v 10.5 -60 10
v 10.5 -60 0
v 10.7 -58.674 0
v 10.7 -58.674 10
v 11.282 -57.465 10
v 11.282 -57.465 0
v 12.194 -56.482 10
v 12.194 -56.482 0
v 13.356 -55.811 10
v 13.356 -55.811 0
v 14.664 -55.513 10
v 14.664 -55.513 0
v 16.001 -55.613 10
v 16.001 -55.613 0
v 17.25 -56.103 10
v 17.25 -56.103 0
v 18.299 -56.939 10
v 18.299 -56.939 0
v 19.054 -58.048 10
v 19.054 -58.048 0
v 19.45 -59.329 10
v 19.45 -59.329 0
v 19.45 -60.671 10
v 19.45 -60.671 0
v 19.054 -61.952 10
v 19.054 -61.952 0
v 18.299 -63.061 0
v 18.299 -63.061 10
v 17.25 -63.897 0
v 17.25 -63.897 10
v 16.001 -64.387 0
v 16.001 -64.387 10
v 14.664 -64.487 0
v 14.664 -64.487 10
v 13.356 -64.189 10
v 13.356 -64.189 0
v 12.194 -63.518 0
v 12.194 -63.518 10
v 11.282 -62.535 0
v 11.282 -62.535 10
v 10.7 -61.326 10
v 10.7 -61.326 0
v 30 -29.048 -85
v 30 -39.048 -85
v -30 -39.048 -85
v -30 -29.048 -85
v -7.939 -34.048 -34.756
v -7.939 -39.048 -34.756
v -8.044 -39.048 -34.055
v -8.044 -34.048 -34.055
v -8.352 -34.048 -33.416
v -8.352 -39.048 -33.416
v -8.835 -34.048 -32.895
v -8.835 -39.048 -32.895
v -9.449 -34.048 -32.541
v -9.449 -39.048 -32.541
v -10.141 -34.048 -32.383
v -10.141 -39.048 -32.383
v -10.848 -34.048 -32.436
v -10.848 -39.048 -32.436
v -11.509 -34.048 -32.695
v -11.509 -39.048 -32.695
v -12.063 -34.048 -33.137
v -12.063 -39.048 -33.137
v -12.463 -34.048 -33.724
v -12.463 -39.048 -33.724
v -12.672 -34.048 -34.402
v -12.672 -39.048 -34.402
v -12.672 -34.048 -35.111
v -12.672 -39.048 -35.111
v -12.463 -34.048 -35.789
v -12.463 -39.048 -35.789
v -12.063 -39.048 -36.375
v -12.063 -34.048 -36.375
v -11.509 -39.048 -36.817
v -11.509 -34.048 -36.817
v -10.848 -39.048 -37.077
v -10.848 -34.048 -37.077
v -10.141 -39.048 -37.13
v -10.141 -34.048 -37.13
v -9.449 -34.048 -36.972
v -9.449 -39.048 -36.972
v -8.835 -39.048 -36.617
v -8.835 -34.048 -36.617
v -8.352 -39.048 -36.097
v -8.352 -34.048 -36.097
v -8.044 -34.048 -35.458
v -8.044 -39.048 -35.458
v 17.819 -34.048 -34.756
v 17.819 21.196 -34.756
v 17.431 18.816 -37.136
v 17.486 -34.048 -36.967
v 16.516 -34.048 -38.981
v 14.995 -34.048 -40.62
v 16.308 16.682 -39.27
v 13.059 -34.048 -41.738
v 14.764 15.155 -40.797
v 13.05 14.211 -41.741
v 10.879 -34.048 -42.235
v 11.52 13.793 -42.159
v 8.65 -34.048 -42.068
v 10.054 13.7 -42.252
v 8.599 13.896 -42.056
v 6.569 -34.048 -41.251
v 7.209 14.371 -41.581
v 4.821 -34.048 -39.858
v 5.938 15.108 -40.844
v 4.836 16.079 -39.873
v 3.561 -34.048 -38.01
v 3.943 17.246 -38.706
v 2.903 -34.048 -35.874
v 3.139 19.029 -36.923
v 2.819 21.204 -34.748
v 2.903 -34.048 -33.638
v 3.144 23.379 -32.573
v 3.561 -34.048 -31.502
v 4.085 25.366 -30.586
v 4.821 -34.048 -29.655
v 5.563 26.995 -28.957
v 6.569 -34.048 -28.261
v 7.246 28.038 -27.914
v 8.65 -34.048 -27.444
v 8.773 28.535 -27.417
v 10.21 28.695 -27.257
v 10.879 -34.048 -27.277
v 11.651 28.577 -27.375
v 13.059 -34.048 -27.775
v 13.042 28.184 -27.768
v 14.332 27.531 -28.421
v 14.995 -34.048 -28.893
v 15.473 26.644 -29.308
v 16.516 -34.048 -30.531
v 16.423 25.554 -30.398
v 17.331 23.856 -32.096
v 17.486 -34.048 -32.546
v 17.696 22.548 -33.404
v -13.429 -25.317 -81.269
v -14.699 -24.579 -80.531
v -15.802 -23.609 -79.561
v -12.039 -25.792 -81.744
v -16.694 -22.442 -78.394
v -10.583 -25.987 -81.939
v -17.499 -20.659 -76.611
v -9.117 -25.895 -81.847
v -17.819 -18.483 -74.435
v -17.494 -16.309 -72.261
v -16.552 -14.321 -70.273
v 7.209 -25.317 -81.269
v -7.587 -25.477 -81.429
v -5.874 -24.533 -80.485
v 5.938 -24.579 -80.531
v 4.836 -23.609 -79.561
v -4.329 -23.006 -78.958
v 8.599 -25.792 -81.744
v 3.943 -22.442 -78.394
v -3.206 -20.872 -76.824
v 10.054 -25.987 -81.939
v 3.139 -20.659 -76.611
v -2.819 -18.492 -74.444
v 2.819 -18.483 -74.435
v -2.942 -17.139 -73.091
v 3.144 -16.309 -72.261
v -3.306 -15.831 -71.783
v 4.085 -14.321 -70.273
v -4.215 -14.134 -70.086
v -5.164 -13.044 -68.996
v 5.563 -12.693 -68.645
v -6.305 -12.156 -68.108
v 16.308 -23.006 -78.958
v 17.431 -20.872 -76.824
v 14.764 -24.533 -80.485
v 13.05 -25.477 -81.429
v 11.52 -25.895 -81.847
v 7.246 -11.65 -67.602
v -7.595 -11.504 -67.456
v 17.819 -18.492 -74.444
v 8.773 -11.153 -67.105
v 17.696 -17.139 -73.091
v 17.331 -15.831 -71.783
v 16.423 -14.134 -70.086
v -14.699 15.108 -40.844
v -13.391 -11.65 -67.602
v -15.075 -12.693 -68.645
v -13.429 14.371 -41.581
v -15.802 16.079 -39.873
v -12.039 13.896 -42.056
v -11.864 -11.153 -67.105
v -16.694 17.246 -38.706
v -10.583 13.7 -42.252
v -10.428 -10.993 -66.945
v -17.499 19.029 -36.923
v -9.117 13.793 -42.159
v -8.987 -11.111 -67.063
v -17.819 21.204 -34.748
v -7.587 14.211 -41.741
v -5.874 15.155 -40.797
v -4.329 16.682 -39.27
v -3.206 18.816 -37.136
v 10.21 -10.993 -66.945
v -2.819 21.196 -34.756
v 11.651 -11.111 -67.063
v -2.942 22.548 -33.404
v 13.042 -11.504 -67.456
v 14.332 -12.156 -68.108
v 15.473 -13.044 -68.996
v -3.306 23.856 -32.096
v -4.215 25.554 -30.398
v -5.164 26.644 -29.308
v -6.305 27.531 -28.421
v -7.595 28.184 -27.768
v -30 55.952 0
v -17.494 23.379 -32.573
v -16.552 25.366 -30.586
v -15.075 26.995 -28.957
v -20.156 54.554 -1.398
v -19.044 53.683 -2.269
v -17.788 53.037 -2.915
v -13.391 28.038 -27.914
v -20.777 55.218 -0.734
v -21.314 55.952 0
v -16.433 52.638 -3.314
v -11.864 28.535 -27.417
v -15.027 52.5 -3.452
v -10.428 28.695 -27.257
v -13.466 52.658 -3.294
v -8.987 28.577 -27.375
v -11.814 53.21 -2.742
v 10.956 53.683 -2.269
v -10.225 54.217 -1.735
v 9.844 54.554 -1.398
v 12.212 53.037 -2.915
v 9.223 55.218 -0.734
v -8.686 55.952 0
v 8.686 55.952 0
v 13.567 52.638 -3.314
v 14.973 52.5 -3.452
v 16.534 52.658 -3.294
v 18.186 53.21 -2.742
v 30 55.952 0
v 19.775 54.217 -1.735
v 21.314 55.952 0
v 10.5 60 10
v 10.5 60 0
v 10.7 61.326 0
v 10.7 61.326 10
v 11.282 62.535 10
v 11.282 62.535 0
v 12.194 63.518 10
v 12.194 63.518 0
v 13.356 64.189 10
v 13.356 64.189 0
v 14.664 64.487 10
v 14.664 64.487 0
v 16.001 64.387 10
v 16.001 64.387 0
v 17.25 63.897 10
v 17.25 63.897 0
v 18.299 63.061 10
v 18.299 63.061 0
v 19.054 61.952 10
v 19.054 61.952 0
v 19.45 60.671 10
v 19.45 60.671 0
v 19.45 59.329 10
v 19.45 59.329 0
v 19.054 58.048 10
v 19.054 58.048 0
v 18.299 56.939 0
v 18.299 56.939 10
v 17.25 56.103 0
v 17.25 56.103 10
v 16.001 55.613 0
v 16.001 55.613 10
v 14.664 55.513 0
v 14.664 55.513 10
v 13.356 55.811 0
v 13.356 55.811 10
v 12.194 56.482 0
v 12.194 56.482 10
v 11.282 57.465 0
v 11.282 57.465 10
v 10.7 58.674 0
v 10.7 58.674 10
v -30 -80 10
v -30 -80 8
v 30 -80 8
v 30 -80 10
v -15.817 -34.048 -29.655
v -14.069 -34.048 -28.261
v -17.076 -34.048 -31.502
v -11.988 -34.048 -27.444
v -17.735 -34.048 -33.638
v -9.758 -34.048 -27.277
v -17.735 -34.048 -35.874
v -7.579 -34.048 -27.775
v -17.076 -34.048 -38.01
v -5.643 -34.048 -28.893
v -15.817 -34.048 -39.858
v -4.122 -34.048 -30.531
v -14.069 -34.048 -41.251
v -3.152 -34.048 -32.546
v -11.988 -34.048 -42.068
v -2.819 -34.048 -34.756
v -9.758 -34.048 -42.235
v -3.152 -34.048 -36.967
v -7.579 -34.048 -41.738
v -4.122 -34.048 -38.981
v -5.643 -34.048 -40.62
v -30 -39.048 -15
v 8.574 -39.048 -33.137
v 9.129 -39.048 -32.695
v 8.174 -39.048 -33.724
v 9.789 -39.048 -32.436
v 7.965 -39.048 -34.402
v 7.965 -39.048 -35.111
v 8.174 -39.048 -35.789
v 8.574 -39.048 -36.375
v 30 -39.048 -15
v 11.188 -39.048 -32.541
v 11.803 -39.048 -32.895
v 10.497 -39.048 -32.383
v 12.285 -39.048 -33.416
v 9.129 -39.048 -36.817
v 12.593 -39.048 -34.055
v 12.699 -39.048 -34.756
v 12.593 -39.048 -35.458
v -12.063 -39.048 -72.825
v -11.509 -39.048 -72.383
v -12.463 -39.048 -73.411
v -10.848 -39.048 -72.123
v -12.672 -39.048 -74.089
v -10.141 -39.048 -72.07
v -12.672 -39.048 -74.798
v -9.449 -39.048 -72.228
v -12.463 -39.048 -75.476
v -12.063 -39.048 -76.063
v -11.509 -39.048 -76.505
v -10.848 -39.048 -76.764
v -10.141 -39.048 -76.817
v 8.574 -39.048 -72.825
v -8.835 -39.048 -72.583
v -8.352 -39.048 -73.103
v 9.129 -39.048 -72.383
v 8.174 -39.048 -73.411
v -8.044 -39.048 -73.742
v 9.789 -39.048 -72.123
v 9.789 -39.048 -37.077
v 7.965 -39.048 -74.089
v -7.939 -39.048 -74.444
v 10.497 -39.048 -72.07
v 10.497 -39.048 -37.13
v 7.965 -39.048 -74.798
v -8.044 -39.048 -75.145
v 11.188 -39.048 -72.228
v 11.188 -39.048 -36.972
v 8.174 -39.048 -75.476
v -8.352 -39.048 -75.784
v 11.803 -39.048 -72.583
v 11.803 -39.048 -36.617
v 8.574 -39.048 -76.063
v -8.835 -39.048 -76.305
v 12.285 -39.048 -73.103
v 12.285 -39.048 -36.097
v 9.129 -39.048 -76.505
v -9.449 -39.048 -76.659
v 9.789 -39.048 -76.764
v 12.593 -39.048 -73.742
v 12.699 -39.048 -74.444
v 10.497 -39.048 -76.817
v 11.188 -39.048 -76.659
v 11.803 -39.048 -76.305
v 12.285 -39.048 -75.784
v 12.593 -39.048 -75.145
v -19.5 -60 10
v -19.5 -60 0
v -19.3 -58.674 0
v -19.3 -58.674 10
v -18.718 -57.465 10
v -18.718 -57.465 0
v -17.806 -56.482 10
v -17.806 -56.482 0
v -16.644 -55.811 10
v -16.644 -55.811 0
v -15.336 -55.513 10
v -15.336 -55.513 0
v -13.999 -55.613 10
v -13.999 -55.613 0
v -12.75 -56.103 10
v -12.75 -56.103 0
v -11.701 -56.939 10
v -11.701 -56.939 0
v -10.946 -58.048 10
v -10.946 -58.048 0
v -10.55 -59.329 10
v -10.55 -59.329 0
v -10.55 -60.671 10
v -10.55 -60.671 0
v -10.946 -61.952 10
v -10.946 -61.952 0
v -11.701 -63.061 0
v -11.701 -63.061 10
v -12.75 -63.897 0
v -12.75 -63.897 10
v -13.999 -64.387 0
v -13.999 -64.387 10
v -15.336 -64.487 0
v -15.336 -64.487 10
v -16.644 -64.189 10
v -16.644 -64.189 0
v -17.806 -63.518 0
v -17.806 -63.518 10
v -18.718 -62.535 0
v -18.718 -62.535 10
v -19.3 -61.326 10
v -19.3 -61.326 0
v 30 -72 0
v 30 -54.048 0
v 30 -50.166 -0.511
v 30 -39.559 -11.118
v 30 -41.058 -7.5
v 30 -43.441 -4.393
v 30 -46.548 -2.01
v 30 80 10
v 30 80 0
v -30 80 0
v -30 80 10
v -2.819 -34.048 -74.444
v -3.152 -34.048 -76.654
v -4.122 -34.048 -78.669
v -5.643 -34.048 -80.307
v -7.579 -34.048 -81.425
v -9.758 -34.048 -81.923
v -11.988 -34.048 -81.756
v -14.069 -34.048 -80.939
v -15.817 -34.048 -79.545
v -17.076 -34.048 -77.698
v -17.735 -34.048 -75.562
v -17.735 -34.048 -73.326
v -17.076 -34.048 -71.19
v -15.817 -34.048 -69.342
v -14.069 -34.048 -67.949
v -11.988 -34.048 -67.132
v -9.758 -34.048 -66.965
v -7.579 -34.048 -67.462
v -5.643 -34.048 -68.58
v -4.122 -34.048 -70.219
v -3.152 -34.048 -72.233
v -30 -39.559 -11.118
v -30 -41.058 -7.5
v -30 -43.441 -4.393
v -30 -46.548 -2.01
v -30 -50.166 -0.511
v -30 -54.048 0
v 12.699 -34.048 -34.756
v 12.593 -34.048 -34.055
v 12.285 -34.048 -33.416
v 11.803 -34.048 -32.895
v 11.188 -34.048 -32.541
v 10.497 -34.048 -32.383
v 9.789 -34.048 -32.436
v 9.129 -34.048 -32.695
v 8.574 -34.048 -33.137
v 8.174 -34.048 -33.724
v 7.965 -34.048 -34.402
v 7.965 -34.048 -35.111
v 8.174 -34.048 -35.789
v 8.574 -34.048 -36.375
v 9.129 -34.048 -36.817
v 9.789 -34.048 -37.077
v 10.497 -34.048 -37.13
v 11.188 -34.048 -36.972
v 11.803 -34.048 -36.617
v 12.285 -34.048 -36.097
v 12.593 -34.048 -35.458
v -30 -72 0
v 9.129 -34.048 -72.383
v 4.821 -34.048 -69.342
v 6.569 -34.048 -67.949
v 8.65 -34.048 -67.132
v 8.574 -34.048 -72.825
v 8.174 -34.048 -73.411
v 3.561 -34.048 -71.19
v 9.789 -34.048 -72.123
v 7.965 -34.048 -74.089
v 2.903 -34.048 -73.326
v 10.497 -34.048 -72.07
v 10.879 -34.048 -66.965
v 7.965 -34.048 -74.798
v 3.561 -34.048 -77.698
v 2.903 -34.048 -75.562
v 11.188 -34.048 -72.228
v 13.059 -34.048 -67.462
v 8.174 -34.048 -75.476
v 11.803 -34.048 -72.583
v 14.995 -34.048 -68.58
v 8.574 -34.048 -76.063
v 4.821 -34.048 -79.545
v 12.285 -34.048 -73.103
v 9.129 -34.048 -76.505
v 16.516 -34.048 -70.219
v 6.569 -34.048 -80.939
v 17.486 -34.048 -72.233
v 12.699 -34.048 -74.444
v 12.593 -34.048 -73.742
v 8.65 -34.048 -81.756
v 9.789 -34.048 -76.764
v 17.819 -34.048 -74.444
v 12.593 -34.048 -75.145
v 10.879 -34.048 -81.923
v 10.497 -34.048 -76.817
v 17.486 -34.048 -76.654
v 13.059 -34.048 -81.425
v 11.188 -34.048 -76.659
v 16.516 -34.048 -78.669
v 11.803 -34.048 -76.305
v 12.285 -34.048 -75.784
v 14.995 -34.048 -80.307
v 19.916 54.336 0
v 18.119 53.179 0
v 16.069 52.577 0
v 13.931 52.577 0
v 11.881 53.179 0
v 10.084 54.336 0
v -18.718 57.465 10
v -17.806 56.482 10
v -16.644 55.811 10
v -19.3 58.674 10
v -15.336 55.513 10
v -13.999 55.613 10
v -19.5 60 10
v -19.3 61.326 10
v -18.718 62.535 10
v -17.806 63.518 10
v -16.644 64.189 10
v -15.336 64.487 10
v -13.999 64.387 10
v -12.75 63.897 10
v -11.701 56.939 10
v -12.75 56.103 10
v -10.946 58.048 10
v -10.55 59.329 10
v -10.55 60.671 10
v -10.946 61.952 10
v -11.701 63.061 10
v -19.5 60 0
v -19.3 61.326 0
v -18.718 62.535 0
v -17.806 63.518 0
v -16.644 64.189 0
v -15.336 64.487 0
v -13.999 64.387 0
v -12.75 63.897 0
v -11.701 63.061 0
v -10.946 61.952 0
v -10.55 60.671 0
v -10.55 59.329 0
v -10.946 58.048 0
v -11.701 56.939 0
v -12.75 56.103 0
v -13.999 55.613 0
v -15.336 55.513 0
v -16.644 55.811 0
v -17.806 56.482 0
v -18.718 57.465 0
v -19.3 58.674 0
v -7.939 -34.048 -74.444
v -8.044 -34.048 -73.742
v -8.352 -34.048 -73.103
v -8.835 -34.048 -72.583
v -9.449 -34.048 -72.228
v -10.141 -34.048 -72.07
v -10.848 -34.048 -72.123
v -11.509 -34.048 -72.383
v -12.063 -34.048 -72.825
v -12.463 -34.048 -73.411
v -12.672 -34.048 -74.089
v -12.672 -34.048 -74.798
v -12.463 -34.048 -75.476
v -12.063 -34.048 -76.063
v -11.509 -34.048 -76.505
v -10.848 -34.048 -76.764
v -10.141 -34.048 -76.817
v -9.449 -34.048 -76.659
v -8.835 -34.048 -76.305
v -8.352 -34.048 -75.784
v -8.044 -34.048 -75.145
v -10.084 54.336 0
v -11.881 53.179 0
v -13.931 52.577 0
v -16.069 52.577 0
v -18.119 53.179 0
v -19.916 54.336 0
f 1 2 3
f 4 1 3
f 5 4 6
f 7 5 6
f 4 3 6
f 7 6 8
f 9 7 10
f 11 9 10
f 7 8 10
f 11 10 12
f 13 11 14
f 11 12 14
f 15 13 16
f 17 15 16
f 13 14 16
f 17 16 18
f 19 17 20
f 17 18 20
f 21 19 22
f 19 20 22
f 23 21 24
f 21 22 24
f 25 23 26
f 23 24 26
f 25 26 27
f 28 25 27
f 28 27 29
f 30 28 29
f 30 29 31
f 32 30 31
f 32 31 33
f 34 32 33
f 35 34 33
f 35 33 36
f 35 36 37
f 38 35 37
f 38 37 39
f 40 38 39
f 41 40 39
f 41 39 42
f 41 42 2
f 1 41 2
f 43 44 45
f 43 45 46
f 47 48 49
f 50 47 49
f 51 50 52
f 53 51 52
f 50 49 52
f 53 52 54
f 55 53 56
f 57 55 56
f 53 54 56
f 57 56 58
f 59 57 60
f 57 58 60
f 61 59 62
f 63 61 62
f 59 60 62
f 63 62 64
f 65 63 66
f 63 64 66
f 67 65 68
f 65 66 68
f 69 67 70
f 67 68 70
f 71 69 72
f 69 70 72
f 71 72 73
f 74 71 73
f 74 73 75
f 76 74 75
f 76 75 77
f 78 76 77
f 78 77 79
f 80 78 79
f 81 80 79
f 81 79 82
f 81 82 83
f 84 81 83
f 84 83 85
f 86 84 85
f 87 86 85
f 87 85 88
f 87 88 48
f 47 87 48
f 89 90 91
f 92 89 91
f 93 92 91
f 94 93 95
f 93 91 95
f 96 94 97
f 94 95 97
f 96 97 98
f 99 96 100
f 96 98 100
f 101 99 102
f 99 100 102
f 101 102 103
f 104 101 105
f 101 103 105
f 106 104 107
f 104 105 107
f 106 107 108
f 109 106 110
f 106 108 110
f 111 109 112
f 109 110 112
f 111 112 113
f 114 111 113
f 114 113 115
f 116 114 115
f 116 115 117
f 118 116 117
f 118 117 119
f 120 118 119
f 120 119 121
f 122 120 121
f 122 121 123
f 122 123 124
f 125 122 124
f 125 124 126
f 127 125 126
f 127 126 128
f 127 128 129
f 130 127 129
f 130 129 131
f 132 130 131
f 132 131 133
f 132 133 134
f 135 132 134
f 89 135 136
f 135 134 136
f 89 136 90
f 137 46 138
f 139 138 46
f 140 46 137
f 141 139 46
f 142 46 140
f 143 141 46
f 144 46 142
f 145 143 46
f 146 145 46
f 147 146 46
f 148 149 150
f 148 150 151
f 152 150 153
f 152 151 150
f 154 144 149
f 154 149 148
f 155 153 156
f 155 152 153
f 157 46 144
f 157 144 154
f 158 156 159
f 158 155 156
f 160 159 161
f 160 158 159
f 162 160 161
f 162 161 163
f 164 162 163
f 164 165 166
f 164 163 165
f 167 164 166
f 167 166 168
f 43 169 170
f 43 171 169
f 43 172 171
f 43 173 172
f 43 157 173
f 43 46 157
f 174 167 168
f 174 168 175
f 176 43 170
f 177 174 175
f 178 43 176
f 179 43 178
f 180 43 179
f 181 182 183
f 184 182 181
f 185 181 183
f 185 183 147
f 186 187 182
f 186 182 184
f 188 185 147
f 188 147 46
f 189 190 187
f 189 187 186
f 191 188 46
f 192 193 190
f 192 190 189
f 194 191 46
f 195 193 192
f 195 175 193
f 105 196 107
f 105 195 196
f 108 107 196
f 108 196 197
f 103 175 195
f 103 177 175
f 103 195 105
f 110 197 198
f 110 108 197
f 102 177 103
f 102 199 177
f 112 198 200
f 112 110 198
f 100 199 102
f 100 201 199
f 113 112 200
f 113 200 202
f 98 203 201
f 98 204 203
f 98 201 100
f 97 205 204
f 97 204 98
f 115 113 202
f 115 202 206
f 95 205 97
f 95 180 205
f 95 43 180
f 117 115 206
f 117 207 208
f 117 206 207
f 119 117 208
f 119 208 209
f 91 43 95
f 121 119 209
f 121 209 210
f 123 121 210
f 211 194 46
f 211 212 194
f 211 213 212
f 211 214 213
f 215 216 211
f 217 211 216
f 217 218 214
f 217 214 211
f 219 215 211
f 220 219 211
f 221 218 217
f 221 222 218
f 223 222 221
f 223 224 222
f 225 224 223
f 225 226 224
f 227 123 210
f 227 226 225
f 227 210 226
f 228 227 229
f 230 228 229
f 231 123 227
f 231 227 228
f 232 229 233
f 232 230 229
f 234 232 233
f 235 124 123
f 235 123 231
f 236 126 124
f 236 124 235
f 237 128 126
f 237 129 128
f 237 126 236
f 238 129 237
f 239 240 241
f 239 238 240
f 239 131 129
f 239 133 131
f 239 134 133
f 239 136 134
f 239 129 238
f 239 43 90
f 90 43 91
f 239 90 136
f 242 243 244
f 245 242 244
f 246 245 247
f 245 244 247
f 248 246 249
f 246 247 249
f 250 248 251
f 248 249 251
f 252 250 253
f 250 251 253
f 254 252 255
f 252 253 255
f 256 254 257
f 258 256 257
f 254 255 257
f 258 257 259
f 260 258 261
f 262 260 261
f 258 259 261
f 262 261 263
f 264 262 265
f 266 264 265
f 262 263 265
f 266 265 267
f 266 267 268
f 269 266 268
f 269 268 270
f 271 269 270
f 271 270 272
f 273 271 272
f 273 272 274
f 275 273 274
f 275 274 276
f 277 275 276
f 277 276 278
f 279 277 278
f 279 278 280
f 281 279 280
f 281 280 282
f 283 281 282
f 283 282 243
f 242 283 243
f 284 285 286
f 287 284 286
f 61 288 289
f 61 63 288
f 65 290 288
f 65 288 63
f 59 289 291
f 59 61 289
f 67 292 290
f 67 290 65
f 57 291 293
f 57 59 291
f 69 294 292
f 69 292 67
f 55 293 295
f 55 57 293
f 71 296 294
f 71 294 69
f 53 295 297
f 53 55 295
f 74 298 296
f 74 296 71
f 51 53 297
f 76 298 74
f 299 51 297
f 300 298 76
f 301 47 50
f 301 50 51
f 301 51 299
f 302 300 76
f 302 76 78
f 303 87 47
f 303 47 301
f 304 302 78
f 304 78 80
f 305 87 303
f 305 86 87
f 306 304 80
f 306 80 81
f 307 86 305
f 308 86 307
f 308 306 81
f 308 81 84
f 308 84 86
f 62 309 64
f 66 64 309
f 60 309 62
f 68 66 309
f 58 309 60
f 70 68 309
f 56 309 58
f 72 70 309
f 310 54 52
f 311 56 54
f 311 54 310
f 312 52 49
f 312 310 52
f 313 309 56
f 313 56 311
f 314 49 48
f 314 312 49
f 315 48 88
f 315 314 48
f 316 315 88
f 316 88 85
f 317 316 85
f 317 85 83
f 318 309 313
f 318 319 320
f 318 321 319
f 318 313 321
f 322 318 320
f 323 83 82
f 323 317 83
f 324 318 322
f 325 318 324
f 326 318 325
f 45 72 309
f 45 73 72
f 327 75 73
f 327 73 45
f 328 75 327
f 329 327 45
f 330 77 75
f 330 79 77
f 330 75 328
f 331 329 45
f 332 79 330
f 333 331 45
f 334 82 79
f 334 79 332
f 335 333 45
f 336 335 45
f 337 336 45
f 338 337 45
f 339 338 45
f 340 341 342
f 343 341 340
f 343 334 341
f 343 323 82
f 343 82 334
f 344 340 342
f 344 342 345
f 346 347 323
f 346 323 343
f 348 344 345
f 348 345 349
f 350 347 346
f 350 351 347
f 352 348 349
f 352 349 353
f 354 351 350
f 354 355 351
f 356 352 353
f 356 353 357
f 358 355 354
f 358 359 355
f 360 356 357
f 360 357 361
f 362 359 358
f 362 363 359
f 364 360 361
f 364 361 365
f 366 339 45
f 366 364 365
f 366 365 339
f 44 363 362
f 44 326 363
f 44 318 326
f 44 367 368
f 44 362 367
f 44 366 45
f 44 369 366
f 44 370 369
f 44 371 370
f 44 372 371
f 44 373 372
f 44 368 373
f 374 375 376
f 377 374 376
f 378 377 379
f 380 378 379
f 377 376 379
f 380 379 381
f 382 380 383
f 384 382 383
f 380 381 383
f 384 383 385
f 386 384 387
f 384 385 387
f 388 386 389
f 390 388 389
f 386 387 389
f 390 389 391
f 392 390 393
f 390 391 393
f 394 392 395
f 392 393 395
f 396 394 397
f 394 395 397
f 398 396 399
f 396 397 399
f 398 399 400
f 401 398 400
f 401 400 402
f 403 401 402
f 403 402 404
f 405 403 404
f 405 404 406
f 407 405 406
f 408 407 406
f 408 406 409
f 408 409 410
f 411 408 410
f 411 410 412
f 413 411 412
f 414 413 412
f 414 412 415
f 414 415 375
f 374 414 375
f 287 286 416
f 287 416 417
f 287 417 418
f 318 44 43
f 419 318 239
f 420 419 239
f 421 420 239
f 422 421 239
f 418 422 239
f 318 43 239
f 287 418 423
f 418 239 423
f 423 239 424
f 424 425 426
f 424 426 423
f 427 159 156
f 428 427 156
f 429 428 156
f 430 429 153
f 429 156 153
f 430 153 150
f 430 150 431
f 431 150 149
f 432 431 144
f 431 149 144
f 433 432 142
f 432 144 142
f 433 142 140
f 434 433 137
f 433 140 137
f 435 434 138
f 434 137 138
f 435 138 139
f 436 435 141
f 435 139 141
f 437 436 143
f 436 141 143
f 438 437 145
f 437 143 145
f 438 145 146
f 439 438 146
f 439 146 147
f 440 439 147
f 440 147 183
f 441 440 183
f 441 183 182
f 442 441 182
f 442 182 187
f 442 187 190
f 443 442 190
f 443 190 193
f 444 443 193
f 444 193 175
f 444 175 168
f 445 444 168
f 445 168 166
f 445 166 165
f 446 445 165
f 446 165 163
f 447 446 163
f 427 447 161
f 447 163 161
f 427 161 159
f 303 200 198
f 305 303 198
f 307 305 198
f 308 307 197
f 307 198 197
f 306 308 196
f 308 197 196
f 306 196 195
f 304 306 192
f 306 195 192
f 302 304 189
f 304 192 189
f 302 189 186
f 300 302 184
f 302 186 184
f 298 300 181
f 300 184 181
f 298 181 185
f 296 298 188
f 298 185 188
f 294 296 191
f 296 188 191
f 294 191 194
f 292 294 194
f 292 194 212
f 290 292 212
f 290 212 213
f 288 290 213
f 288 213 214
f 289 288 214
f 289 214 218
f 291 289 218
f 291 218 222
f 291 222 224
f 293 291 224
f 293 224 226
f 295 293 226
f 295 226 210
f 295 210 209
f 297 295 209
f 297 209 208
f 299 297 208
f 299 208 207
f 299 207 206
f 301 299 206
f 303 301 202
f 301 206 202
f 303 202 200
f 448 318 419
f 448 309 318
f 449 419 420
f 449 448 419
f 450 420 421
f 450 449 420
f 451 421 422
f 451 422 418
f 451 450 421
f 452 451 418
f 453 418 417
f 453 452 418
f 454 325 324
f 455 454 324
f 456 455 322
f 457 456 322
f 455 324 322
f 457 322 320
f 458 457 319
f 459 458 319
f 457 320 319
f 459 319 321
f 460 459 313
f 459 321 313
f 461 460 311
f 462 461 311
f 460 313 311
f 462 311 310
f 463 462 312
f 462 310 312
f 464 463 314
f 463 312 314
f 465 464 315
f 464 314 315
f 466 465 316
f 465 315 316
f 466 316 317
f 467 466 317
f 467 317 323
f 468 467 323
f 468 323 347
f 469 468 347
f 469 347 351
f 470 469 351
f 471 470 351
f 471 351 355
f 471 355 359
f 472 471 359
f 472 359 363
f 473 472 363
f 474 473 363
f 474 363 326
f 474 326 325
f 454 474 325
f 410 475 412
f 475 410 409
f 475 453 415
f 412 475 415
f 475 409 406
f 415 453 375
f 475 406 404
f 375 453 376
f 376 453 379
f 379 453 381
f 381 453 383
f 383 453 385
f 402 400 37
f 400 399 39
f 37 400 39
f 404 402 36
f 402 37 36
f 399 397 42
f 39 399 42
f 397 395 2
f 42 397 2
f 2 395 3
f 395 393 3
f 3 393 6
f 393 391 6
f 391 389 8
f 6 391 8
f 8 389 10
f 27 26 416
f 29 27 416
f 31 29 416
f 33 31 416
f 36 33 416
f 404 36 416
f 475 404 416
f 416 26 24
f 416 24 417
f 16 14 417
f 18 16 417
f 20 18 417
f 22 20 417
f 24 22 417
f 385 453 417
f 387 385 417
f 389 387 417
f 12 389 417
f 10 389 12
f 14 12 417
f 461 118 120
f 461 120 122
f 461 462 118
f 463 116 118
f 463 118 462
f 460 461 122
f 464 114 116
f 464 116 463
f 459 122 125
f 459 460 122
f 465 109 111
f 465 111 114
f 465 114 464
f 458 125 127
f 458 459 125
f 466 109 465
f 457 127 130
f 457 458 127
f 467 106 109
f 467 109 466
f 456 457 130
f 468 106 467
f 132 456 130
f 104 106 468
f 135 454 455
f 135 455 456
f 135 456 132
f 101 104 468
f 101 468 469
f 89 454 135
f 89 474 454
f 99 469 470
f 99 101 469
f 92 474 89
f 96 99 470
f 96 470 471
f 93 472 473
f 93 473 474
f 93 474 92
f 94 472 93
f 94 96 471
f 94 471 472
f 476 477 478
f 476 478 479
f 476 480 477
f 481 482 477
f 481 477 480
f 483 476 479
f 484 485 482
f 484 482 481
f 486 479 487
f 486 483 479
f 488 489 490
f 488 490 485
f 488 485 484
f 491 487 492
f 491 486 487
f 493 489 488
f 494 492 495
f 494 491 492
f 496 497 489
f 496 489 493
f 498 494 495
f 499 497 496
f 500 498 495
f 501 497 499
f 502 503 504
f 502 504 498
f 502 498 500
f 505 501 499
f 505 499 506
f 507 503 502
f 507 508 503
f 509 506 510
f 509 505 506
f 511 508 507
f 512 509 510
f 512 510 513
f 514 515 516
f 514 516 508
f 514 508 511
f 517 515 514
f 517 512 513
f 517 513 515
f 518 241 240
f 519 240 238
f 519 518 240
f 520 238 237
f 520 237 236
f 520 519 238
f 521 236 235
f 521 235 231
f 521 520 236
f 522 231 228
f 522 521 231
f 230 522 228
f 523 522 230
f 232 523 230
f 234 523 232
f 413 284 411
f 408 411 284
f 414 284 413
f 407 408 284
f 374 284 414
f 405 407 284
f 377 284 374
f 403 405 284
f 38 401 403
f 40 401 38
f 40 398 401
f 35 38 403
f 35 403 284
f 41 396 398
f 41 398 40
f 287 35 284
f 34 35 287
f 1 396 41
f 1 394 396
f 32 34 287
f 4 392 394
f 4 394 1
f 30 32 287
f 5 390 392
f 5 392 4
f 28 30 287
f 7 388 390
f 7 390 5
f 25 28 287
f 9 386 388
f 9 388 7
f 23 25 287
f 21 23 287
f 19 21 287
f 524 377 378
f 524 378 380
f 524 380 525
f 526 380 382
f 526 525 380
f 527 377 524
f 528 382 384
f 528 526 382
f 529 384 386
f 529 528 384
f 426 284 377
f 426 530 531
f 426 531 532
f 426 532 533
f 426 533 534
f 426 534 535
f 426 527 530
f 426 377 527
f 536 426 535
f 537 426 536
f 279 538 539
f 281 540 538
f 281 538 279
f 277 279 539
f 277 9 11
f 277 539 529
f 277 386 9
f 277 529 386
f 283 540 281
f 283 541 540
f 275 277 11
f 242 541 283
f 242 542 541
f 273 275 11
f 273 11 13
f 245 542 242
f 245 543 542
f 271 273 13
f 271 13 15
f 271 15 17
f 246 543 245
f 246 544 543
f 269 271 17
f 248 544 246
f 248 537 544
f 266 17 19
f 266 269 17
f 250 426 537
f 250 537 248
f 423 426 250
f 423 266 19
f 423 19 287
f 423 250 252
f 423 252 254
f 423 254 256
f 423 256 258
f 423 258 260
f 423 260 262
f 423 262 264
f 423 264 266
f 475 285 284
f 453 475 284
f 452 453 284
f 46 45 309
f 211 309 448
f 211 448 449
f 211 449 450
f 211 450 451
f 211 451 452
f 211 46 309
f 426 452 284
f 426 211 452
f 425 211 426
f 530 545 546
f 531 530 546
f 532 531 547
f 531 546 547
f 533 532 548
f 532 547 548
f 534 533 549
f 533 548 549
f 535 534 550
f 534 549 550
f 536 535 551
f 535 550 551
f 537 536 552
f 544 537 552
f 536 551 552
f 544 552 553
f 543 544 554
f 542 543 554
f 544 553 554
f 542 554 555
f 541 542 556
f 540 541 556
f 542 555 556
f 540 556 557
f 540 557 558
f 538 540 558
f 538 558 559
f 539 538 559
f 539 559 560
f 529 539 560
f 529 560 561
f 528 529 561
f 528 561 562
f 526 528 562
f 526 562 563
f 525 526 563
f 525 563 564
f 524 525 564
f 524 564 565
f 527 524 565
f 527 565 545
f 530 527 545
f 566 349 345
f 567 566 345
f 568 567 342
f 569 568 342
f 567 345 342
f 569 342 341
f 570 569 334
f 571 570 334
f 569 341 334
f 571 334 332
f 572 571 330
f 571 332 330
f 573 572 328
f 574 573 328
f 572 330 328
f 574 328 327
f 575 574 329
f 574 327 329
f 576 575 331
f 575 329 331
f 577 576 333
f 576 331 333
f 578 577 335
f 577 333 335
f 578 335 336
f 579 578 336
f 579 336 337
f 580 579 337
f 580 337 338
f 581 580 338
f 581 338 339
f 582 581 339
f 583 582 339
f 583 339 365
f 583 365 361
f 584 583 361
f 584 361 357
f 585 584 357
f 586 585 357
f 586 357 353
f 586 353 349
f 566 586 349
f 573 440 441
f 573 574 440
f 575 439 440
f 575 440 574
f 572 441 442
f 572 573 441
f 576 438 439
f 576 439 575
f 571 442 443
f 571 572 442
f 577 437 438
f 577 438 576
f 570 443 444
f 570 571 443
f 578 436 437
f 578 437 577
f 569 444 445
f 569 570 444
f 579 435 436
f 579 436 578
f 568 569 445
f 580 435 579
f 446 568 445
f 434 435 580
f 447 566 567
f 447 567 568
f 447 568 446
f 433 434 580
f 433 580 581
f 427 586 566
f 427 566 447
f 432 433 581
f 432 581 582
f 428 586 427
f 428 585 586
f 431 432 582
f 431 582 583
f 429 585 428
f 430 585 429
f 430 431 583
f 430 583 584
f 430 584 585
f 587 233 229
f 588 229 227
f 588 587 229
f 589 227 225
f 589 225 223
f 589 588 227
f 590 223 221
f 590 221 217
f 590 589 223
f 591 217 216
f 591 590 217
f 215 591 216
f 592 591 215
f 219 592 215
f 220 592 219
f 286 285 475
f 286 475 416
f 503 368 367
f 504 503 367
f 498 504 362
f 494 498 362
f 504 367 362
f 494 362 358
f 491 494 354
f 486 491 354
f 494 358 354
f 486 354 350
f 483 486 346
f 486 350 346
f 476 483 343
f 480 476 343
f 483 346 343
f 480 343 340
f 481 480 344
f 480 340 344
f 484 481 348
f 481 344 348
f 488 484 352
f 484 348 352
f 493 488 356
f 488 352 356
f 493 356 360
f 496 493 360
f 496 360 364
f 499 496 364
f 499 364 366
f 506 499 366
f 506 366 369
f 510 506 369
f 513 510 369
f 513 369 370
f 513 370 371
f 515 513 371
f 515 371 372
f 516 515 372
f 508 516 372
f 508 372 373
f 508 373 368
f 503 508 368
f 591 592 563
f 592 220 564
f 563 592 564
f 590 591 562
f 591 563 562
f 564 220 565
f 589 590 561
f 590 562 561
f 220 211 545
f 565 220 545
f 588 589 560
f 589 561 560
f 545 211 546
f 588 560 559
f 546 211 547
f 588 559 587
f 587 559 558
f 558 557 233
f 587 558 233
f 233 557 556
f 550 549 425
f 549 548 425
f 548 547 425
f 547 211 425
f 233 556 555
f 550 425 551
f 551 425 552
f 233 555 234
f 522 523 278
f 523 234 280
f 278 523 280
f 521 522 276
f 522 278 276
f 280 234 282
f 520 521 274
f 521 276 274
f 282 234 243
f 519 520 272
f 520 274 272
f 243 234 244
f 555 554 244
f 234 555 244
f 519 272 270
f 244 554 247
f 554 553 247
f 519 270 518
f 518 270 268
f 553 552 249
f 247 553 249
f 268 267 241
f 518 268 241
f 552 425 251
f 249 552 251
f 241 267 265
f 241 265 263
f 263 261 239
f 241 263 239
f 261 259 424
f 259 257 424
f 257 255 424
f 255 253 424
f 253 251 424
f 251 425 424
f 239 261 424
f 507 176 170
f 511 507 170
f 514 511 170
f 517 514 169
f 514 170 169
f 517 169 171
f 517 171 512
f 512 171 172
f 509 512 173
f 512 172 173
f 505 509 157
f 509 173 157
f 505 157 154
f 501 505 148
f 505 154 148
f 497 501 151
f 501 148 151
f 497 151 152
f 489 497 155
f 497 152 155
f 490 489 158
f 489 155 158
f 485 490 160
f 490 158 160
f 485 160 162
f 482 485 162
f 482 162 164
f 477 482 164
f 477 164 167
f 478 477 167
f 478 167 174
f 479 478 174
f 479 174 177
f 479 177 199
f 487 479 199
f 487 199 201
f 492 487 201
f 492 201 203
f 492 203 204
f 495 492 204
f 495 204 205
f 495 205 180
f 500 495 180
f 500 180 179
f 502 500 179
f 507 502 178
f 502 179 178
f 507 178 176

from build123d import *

# Parameters (mm, degrees)
SKETCH1_W                       = 60
SKETCH1_H                       = 160
BOSS_EXTRUDE1_DEPTH             = 10
BOSS_EXTRUDE2_REACH             = 32
BOSS_EXTRUDE2_DIRECTION_2_REACH = 32
CUT_EXTRUDE1_REACH              = 121.048
SKETCH3_R                       = 2.38
CHAMFER1_SIZE                   = 8
CUT_EXTRUDE2_REACH              = 12
SKETCH4_R                       = 4.5
SKETCH5_R                       = 7.5
CUT_EXTRUDE4_DEPTH              = 114.048
SKETCH6_R                       = 7.5
CUT_EXTRUDE5_DEPTH              = 5
FILLET1_R                       = 15


with BuildPart() as part:
    # Sketch1 → Boss-Extrude1 (new body)
    with BuildSketch(Plane.XY):
        Rectangle(SKETCH1_W, SKETCH1_H)
    extrude(amount=BOSS_EXTRUDE1_DEPTH)

    # Boss-Extrude2: up to this face of the body (flat: up to its plane)
    boss_extrude2_end = Plane(part.part.faces().sort_by_distance((30, 0, 5))[0])
    # Sketch2 → Boss-Extrude2 (add, up to the picked face)
    with BuildSketch(Plane(origin=(0, 0, 0), x_dir=(0, 0, -1), z_dir=(1, 0, 0)), mode=Mode.PRIVATE) as boss_extrude2_sk1:
        Polygon((0, -29.048), (0, -39.048), (85, -39.048), (85, -29.048), (0, 55.952), align=None)
    boss_extrude2_tool1 = split(extrude(boss_extrude2_sk1.sketch, amount=BOSS_EXTRUDE2_REACH, mode=Mode.PRIVATE), bisect_by=boss_extrude2_end, keep=Keep.BOTH, mode=Mode.PRIVATE)
    add(boss_extrude2_tool1.solids().sort_by_distance((0, -7.063873, -31.031746))[0])

    # Boss-Extrude2 direction 2: up to this face of the body (flat: up to its plane)
    boss_extrude2_direction_2_end = Plane(part.part.faces().sort_by_distance((-30, 0, 5))[0])
    # Sketch2 → Boss-Extrude2 direction 2 (add, up to the picked face)
    with BuildSketch(Plane(origin=(0, 0, 0), x_dir=(0, 0, -1), z_dir=(1, 0, 0)), mode=Mode.PRIVATE) as boss_extrude2_direction_2_sk1:
        Polygon((0, -29.048), (0, -39.048), (85, -39.048), (85, -29.048), (0, 55.952), align=None)
    boss_extrude2_direction_2_tool1 = split(extrude(boss_extrude2_direction_2_sk1.sketch, amount=-BOSS_EXTRUDE2_DIRECTION_2_REACH, mode=Mode.PRIVATE), bisect_by=boss_extrude2_direction_2_end, keep=Keep.BOTH, mode=Mode.PRIVATE)
    add(boss_extrude2_direction_2_tool1.solids().sort_by_distance((0, -7.063873, -31.031746))[0])

    # Sketch3 → Cut-Extrude1 (cut, up to next)
    with BuildSketch(Plane.XZ.offset(39.048), mode=Mode.PRIVATE) as cut_extrude1_sk1:
        with Locations((-10.31875, -34.75625)):
            Circle(SKETCH3_R)
    cut_extrude1_tool1 = extrude(cut_extrude1_sk1.sketch, amount=-CUT_EXTRUDE1_REACH, mode=Mode.PRIVATE) & part.part
    add(cut_extrude1_tool1.solids().sort_by_distance((-10.31875, -39.048, -34.75625))[0], mode=Mode.SUBTRACT)
    # Sketch3 → Cut-Extrude1 (cut, up to next)
    with BuildSketch(Plane.XZ.offset(39.048), mode=Mode.PRIVATE) as cut_extrude1_sk2:
        with Locations((10.31875, -34.75625)):
            Circle(SKETCH3_R)
    cut_extrude1_tool2 = extrude(cut_extrude1_sk2.sketch, amount=-CUT_EXTRUDE1_REACH, mode=Mode.PRIVATE) & part.part
    add(cut_extrude1_tool2.solids().sort_by_distance((10.31875, -39.048, -34.75625))[0], mode=Mode.SUBTRACT)
    # Sketch3 → Cut-Extrude1 (cut, up to next)
    with BuildSketch(Plane.XZ.offset(39.048), mode=Mode.PRIVATE) as cut_extrude1_sk3:
        with Locations((10.31875, -74.44375)):
            Circle(SKETCH3_R)
    cut_extrude1_tool3 = extrude(cut_extrude1_sk3.sketch, amount=-CUT_EXTRUDE1_REACH, mode=Mode.PRIVATE) & part.part
    add(cut_extrude1_tool3.solids().sort_by_distance((10.31875, -39.048, -74.44375))[0], mode=Mode.SUBTRACT)
    # Sketch3 → Cut-Extrude1 (cut, up to next)
    with BuildSketch(Plane.XZ.offset(39.048), mode=Mode.PRIVATE) as cut_extrude1_sk4:
        with Locations((-10.31875, -74.44375)):
            Circle(SKETCH3_R)
    cut_extrude1_tool4 = extrude(cut_extrude1_sk4.sketch, amount=-CUT_EXTRUDE1_REACH, mode=Mode.PRIVATE) & part.part
    add(cut_extrude1_tool4.solids().sort_by_distance((-10.31875, -39.048, -74.44375))[0], mode=Mode.SUBTRACT)

    # Chamfer1
    chamfer1_edges = [part.edges().sort_by_distance(p)[0] for p in [
        (0, -80, 0),
    ]]
    chamfer(chamfer1_edges, length=CHAMFER1_SIZE)

    # Sketch4 → Cut-Extrude2 (cut, up to next)
    with BuildSketch(Plane(origin=(0, 0, 0), x_dir=(-1, 0, 0), z_dir=(0, 0, -1)), mode=Mode.PRIVATE) as cut_extrude2_sk1:
        with Locations((-15, -60)):
            Circle(SKETCH4_R)
    cut_extrude2_tool1 = extrude(cut_extrude2_sk1.sketch, amount=-CUT_EXTRUDE2_REACH, mode=Mode.PRIVATE) & part.part
    add(cut_extrude2_tool1.solids().sort_by_distance((15, -60, 0))[0], mode=Mode.SUBTRACT)
    # Sketch4 → Cut-Extrude2 (cut, up to next)
    with BuildSketch(Plane(origin=(0, 0, 0), x_dir=(-1, 0, 0), z_dir=(0, 0, -1)), mode=Mode.PRIVATE) as cut_extrude2_sk2:
        with Locations((15, -60)):
            Circle(SKETCH4_R)
    cut_extrude2_tool2 = extrude(cut_extrude2_sk2.sketch, amount=-CUT_EXTRUDE2_REACH, mode=Mode.PRIVATE) & part.part
    add(cut_extrude2_tool2.solids().sort_by_distance((-15, -60, 0))[0], mode=Mode.SUBTRACT)
    # Sketch4 → Cut-Extrude2 (cut, up to next)
    with BuildSketch(Plane(origin=(0, 0, 0), x_dir=(-1, 0, 0), z_dir=(0, 0, -1)), mode=Mode.PRIVATE) as cut_extrude2_sk3:
        with Locations((-15, 60)):
            Circle(SKETCH4_R)
    cut_extrude2_tool3 = extrude(cut_extrude2_sk3.sketch, amount=-CUT_EXTRUDE2_REACH, mode=Mode.PRIVATE) & part.part
    add(cut_extrude2_tool3.solids().sort_by_distance((15, 60, 0))[0], mode=Mode.SUBTRACT)
    # Sketch4 → Cut-Extrude2 (cut, up to next)
    with BuildSketch(Plane(origin=(0, 0, 0), x_dir=(-1, 0, 0), z_dir=(0, 0, -1)), mode=Mode.PRIVATE) as cut_extrude2_sk4:
        with Locations((15, 60)):
            Circle(SKETCH4_R)
    cut_extrude2_tool4 = extrude(cut_extrude2_sk4.sketch, amount=-CUT_EXTRUDE2_REACH, mode=Mode.PRIVATE) & part.part
    add(cut_extrude2_tool4.solids().sort_by_distance((-15, 60, 0))[0], mode=Mode.SUBTRACT)

    # Sketch5 → Cut-Extrude4 (cut)
    with BuildSketch(Plane(origin=(0, 80, 0), x_dir=(1, 0, 0), z_dir=(0, 1, 0))):
        with Locations((-10.31875, 74.44375)):
            Circle(SKETCH5_R)
        with Locations((10.31875, 74.44375)):
            Circle(SKETCH5_R)
        with Locations((-10.31875, 34.75625)):
            Circle(SKETCH5_R)
        with Locations((10.31875, 34.75625)):
            Circle(SKETCH5_R)
    extrude(amount=-CUT_EXTRUDE4_DEPTH, mode=Mode.SUBTRACT)

    # Sketch6 → Cut-Extrude5 (cut)
    with BuildSketch(Plane(origin=(0, 0, 0), x_dir=(-1, 0, 0), z_dir=(0, 0, -1))):
        with Locations((-15, 60)):
            Circle(SKETCH6_R)
        with Locations((15, 60)):
            Circle(SKETCH6_R)
    extrude(amount=CUT_EXTRUDE5_DEPTH, mode=Mode.SUBTRACT)

    # Fillet1
    fillet1_edges = [part.edges().sort_by_distance(p)[0] for p in [
        (0, -39.048, 0),
    ]]
    fillet(fillet1_edges, radius=FILLET1_R)


solid = part.part
